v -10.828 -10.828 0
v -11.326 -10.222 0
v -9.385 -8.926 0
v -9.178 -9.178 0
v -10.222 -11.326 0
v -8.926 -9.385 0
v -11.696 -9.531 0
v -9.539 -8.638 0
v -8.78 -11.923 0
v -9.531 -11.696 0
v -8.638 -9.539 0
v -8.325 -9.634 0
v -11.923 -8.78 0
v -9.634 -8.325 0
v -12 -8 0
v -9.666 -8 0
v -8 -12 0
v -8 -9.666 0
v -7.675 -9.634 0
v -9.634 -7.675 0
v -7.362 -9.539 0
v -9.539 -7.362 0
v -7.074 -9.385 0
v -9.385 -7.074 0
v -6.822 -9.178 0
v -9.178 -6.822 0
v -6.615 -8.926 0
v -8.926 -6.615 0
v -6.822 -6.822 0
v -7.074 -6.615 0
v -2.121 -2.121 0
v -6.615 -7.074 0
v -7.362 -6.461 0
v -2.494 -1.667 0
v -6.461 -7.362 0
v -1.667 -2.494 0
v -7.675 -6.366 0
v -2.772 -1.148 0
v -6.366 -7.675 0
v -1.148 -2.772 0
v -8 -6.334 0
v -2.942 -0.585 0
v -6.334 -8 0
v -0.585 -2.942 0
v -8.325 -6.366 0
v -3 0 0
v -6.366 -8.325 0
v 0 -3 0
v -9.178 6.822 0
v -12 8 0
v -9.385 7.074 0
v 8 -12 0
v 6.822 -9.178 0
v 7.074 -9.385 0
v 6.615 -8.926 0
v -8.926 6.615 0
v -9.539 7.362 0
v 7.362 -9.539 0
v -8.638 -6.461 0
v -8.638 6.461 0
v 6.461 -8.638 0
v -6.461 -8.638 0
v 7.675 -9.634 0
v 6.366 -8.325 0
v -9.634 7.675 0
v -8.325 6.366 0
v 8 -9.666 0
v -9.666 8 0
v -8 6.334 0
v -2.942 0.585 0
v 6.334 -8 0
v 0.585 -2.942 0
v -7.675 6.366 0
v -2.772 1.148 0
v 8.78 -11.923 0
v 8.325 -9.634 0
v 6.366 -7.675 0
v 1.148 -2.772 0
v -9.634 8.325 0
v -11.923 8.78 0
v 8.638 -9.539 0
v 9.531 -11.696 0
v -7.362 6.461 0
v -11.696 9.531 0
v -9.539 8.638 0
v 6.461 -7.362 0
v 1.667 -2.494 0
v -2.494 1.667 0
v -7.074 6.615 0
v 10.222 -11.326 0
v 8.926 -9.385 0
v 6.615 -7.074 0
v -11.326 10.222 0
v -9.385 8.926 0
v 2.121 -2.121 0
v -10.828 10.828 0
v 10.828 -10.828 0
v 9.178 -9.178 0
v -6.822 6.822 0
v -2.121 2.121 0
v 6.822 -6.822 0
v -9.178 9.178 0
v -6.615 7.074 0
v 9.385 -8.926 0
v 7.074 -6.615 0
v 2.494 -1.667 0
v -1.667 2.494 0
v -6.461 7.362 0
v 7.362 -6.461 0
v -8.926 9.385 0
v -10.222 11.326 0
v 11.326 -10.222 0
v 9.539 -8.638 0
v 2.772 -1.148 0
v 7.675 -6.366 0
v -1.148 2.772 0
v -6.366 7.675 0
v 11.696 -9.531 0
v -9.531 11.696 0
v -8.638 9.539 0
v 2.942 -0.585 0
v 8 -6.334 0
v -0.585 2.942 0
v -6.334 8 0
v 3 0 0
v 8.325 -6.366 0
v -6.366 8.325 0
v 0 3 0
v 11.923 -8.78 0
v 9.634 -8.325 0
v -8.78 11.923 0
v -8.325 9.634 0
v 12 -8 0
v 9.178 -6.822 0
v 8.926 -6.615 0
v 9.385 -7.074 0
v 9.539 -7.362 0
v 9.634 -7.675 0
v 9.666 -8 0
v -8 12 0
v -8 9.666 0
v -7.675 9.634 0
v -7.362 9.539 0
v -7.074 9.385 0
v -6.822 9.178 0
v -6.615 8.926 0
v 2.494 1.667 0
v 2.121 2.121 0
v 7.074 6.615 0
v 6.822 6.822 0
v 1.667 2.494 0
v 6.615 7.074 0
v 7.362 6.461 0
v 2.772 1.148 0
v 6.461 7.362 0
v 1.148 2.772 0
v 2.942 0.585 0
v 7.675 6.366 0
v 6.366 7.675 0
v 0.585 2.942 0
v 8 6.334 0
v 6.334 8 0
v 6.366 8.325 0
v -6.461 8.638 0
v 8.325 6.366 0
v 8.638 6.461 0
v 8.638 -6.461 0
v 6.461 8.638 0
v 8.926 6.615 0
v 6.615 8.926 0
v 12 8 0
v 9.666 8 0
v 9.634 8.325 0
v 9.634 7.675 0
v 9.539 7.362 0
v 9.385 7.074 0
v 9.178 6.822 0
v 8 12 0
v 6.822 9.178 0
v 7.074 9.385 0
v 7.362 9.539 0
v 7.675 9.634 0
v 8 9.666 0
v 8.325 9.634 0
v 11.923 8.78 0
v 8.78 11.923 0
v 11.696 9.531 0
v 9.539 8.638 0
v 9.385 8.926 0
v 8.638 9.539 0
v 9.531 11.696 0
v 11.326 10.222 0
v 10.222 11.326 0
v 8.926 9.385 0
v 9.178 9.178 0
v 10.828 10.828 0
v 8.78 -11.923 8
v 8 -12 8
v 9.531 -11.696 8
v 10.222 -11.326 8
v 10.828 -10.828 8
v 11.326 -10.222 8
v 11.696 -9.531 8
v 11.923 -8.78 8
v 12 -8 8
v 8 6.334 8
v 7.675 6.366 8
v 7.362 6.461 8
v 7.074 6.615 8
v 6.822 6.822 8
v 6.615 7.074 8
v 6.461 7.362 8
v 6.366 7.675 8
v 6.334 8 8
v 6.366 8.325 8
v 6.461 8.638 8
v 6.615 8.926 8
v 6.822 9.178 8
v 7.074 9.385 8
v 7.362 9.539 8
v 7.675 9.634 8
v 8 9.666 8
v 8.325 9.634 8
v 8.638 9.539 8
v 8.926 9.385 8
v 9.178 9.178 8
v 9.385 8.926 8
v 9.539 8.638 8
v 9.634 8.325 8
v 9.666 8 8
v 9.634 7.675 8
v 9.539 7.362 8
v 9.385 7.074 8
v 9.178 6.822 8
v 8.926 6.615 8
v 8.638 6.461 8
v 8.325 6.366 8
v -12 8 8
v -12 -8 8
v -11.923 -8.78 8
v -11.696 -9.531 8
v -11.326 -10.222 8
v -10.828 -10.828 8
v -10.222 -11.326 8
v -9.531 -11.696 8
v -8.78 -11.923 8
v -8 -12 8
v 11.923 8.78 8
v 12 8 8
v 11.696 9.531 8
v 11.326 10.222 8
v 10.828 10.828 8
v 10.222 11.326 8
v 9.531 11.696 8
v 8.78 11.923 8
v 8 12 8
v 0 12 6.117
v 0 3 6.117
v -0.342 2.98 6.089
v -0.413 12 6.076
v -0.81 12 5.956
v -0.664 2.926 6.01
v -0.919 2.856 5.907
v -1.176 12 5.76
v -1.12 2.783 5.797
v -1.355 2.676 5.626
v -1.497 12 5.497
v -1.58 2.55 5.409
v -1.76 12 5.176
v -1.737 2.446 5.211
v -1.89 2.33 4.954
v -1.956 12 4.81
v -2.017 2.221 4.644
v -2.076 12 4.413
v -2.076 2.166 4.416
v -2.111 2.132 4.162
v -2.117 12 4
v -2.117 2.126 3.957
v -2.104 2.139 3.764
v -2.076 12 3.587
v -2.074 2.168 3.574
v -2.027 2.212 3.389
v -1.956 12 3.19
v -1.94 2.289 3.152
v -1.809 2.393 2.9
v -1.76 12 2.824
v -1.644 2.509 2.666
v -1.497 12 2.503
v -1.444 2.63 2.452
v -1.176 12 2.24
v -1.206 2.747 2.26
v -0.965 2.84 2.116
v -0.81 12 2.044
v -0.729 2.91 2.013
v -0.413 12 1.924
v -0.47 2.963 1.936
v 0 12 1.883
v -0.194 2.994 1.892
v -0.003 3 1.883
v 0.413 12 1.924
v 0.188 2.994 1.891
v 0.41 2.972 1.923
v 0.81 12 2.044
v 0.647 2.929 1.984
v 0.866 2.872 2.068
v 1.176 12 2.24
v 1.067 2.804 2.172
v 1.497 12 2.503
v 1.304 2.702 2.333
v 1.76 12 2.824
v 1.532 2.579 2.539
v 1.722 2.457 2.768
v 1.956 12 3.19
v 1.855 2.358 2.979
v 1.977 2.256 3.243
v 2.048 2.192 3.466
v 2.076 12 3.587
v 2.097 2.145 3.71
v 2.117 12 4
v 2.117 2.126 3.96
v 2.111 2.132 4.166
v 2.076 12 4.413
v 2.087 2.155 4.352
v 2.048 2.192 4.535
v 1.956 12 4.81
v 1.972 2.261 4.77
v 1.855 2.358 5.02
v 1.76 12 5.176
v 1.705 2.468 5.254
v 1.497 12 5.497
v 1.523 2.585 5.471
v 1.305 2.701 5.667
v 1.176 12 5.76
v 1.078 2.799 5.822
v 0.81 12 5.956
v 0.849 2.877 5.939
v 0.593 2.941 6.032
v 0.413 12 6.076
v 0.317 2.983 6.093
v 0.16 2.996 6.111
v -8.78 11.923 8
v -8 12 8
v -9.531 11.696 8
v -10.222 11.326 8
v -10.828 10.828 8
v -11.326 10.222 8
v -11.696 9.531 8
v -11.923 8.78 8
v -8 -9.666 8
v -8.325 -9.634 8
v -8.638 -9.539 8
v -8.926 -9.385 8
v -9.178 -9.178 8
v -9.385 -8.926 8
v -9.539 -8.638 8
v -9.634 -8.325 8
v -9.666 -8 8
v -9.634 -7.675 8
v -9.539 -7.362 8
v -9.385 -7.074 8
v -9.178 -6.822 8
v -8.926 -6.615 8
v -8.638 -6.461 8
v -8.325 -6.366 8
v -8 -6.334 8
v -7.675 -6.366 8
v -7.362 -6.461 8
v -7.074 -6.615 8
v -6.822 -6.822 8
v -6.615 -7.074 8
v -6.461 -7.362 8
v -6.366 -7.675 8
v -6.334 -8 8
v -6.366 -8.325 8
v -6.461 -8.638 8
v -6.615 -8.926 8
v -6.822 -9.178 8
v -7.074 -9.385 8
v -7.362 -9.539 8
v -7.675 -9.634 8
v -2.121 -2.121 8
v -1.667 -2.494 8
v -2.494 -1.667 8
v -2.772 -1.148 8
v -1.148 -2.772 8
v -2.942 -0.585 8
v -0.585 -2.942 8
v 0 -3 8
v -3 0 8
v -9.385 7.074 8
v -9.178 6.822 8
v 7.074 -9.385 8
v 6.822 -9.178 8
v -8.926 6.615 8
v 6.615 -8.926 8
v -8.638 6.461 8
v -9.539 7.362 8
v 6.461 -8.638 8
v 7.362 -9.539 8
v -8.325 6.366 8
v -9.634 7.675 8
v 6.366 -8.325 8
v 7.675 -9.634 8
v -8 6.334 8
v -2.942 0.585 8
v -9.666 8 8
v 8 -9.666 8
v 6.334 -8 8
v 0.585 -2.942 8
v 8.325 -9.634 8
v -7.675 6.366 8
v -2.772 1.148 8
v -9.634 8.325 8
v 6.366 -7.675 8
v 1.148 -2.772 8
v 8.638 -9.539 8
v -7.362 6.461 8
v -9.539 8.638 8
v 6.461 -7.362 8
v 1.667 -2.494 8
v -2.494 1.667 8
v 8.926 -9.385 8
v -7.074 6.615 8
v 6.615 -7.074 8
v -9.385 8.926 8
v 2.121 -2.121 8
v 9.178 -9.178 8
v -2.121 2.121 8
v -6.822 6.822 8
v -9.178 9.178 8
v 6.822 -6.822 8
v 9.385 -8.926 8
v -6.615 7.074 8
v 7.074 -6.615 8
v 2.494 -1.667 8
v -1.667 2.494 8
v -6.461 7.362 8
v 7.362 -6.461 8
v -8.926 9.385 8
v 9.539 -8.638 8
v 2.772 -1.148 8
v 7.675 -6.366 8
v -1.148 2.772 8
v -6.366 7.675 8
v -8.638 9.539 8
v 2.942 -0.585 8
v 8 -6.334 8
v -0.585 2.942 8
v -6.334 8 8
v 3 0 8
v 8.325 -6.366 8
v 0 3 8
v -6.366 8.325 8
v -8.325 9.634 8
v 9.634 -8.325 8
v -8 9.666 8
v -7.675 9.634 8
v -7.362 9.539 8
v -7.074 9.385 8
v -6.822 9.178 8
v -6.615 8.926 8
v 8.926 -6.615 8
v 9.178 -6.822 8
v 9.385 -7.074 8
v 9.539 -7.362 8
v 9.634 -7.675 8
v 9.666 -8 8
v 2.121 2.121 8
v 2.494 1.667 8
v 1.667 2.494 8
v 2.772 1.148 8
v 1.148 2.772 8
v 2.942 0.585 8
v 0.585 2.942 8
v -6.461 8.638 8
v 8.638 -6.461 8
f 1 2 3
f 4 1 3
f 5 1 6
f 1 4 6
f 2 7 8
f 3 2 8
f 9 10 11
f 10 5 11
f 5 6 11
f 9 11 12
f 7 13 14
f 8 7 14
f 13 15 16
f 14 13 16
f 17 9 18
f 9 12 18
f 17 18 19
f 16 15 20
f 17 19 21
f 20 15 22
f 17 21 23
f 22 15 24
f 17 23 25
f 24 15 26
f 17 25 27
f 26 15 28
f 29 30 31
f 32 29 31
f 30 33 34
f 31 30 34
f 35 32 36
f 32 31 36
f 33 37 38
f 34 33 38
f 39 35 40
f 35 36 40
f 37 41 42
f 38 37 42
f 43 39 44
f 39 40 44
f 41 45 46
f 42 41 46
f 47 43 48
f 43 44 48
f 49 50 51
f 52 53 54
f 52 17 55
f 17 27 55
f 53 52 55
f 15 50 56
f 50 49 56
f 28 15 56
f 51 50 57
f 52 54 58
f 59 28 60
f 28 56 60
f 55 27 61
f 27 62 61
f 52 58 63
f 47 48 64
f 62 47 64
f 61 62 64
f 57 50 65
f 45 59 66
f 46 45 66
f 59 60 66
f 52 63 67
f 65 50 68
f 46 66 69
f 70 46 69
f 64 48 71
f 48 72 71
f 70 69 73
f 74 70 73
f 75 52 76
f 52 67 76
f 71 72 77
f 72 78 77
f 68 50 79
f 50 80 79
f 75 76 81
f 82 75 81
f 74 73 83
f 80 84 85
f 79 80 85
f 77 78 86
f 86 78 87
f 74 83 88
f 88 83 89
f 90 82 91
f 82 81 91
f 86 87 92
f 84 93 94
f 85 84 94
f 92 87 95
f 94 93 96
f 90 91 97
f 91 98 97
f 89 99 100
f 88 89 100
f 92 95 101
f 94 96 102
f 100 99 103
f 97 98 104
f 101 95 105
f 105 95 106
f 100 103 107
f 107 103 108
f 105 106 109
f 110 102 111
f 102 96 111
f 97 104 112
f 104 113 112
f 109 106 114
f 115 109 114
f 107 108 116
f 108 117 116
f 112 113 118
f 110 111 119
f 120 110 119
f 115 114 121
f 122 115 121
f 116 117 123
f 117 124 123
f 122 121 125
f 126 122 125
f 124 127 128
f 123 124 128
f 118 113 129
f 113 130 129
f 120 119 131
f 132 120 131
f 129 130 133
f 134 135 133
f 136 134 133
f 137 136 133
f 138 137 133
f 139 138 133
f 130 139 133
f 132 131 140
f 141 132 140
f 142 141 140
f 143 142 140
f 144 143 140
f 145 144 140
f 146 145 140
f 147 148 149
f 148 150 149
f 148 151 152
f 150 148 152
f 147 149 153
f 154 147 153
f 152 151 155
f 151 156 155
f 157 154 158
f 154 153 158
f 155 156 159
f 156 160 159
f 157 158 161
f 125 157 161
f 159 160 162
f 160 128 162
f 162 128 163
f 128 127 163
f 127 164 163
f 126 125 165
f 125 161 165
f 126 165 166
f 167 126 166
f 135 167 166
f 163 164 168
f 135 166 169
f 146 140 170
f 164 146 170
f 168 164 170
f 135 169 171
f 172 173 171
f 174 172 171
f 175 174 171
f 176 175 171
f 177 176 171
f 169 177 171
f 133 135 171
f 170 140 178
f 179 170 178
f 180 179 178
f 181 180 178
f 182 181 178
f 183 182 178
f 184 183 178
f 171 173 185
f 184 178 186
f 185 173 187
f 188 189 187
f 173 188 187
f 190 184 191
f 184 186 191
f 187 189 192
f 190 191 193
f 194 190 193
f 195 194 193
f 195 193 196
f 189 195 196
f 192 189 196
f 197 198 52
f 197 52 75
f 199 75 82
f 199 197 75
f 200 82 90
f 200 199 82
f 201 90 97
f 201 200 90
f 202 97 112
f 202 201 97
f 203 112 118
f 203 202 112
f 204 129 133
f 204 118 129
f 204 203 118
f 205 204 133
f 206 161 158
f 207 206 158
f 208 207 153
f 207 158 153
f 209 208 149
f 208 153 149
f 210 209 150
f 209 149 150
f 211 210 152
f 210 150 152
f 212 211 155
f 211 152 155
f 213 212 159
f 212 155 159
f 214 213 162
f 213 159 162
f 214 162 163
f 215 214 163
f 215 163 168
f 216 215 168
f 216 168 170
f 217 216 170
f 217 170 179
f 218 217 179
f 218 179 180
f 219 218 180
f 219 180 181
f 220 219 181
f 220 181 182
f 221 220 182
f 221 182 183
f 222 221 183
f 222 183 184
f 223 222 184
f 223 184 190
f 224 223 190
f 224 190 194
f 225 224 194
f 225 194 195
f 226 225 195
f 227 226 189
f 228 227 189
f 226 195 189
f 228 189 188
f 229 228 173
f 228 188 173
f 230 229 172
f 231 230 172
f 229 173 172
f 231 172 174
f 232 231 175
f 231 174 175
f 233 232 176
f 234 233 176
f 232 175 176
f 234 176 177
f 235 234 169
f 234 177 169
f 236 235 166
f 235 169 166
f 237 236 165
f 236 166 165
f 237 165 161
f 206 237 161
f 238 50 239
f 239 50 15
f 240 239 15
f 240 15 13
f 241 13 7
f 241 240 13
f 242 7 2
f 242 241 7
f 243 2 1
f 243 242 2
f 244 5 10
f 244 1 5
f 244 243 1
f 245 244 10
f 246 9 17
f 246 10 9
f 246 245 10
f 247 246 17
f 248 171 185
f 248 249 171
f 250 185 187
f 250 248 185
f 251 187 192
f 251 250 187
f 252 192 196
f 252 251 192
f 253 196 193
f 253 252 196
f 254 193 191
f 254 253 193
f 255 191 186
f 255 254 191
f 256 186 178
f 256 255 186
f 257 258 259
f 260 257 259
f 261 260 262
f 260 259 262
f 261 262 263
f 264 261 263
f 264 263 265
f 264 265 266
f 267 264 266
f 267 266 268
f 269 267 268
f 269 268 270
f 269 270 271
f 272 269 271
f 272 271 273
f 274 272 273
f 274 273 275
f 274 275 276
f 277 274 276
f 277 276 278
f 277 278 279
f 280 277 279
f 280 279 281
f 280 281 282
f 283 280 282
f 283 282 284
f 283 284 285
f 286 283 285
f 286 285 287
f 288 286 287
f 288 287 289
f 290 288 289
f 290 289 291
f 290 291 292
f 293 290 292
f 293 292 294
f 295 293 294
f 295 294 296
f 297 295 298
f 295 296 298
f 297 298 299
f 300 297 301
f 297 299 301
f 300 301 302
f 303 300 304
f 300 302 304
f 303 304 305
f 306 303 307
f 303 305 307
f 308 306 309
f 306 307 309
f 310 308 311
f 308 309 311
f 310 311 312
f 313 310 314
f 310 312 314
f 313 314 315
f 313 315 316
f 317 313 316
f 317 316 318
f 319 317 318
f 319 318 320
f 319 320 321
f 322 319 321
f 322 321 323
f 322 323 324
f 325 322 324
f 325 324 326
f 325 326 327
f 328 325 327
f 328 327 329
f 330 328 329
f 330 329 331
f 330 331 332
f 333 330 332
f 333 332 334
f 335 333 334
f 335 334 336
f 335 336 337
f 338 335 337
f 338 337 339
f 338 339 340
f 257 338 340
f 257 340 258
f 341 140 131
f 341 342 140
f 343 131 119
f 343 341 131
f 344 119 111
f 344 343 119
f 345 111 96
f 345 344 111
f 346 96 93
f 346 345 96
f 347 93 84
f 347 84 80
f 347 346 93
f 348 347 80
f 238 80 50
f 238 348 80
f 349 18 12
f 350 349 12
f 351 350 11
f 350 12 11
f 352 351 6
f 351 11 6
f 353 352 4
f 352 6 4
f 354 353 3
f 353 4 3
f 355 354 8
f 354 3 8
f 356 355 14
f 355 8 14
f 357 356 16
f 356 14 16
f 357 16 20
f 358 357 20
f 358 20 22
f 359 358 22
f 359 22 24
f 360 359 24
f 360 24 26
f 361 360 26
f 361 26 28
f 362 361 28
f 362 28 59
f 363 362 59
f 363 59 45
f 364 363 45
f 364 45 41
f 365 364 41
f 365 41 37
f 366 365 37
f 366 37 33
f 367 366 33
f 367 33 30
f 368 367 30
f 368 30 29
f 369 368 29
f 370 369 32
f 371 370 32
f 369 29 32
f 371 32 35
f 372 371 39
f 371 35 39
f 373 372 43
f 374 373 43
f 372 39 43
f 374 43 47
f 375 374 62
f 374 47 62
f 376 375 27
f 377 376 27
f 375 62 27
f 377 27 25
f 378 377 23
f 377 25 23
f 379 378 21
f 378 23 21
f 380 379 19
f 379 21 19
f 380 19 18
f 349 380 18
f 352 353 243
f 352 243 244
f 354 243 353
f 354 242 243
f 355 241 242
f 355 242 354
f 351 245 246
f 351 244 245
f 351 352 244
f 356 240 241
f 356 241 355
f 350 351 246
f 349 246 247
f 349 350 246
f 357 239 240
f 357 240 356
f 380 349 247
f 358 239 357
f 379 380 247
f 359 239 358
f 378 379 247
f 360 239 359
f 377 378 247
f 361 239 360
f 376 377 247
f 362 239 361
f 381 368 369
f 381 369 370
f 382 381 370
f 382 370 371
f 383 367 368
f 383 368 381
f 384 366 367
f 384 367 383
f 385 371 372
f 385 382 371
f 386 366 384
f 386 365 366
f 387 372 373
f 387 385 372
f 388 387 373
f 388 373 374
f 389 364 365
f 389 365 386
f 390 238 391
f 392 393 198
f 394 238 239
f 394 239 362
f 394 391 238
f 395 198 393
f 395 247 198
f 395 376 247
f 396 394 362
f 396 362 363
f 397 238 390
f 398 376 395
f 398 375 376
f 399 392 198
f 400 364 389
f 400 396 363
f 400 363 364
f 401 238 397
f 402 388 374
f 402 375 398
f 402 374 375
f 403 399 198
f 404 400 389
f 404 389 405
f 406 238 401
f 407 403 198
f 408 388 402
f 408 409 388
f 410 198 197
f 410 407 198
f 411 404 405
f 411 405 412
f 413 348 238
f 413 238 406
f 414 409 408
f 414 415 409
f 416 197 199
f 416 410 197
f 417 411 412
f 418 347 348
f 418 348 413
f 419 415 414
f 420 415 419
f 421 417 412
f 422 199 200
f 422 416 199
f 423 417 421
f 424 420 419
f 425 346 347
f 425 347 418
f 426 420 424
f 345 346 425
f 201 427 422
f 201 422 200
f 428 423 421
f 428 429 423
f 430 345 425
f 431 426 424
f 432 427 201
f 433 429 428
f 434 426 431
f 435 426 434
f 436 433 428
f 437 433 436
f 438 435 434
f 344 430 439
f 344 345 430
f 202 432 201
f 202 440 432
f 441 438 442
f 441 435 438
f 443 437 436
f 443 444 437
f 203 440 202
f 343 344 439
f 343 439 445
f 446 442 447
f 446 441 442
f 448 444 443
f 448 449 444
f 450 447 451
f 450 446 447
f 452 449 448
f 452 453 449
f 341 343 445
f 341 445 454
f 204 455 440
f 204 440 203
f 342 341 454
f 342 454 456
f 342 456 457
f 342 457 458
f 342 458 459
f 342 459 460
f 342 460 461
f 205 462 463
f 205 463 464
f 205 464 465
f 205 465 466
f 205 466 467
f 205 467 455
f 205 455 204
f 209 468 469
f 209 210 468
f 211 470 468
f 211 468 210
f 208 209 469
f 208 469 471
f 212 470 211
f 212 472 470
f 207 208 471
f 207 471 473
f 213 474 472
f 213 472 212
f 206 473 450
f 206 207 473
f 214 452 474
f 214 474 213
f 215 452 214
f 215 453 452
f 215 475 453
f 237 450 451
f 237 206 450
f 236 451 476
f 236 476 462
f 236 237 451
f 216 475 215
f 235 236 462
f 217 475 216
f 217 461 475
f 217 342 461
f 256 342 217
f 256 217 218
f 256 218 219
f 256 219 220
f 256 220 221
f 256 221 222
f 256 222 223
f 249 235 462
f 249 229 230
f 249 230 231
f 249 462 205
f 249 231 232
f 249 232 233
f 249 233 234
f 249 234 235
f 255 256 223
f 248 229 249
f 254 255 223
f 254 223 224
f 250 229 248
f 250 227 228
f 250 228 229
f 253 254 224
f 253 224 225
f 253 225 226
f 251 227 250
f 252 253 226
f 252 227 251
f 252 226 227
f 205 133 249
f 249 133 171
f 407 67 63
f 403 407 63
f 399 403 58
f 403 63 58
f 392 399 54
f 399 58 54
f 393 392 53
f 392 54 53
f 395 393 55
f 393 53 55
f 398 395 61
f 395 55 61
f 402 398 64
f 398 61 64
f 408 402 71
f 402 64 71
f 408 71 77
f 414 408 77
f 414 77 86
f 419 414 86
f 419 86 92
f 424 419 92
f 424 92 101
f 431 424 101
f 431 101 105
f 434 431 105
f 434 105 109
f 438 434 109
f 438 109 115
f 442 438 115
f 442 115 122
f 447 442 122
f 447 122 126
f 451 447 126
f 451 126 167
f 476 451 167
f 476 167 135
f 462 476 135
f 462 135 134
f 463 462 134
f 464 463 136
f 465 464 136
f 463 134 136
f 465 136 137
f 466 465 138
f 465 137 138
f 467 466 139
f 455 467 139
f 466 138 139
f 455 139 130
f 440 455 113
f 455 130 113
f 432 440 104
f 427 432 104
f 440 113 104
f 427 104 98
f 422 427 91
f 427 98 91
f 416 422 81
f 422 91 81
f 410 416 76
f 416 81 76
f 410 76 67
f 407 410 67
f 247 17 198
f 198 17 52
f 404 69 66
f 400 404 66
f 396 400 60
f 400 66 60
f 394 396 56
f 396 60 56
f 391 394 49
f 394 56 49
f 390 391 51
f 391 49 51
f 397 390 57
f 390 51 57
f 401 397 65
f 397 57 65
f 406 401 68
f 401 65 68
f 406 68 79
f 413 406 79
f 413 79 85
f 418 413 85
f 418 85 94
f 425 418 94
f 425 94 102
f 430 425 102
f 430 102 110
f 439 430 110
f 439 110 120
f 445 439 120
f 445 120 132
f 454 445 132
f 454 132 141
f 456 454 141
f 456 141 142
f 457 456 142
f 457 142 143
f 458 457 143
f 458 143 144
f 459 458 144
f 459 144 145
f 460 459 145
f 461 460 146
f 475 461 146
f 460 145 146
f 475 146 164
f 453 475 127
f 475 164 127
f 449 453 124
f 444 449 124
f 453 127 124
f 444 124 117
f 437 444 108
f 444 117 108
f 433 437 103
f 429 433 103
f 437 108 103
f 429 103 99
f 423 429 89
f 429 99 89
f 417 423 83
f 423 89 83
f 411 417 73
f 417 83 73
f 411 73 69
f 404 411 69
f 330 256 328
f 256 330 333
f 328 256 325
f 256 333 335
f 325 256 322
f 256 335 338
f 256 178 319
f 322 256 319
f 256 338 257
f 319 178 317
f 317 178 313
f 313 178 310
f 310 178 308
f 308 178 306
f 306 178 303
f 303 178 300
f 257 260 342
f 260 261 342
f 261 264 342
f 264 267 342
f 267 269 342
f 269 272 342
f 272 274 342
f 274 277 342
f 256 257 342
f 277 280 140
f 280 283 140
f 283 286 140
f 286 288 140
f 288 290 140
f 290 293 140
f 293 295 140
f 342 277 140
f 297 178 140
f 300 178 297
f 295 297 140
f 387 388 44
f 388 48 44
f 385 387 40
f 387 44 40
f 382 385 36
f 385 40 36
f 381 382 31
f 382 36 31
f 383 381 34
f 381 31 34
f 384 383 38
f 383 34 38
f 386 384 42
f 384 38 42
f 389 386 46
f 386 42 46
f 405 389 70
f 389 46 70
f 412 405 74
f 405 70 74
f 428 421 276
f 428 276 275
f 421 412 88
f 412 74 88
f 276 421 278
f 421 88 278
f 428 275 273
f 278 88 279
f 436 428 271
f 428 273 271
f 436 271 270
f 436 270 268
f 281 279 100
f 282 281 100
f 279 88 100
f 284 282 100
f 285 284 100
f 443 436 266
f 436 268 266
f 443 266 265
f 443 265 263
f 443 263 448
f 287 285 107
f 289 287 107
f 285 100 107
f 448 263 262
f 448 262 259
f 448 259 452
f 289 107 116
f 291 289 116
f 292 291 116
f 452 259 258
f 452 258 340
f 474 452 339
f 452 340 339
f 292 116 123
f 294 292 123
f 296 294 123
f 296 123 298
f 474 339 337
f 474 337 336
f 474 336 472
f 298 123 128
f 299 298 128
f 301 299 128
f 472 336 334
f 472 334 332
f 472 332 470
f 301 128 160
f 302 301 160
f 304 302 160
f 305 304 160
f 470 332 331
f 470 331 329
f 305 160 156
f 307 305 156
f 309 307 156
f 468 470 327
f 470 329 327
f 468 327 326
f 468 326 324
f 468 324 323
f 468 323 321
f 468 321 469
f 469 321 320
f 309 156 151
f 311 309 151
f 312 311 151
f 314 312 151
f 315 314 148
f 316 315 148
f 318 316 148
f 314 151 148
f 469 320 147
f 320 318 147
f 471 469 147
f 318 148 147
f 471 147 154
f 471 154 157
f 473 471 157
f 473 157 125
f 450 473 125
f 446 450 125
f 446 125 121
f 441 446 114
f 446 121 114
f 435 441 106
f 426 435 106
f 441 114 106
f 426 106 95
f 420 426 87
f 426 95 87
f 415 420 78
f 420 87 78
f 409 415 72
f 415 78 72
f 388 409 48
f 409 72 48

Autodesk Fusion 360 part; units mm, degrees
sketch "Sketch1" plane through (0, 0, 0) normal (0, 0, 1) x (1, 0, 0)
  circle A0 centre (0, 0) radius 3 construction
  line L0 (12, 12) -> (-12, 12)
  line L1 (-12, 12) -> (-12, -12)
  line L2 (-12, -12) -> (12, -12)
  line L3 (12, -12) -> (12, 12)
  line L4 (12, 12) -> (-12, -12) construction
  line L5 (-12, 12) -> (12, -12) construction
  circle A1 centre (8, 8) radius 1.5 construction
  arc A2 (12, 8) -> (8, 12) centre (8, 8) ccw construction
  circle A3 centre (0, 0) radius 16 construction
  dimension "d1" = 6
  dimension "d2" = 24
  dimension "d3" = 3
  dimension "d4" = 8
  dimension "d23" = 32
extrude "Extrude1" add sketch "Sketch1" along normal blind 8
hole "Hole1" at (0, 0, 8) direction (0, 0, -1) diameter 6 end through all
sketch "Sketch2" plane through (0, 0, 8) normal (0, 0, 1) x (1, 0, 0)
  circle A0 centre (0, 0) radius 3
  line L0 (12, -12) -> (12, 12)
  line L1 (12, 12) -> (-12, 12)
  line L2 (-12, 12) -> (-12, -12)
  line L3 (-12, -12) -> (12, -12)
  line L4 (8, 8) -> (-8, 8)
  line L5 (-8, 8) -> (-8, -8)
  line L6 (-8, -8) -> (8, -8)
  line L7 (8, -8) -> (8, 8)
  line L8 (8, 8) -> (-8, -8) construction
  line L9 (-8, 8) -> (8, -8) construction
  dimension "d10" = 16
hole "Hole2" at (8, 8, 8) at (-8, 8, 8) at (-8, -8, 8) at (8, -8, 8) direction (0, 0, -1) diameter 3.332 end through all
sketch "Sketch3" plane through (0, 12, 0) normal (0, 1, 0) x (-1, 0, 0)
  line L0 (-12, 0) -> (12, 0)
  line L1 (12, 0) -> (12, 8)
  line L2 (12, 8) -> (-12, 8)
  line L3 (-12, 8) -> (-12, 0)
  line L4 (0, 0) -> (0, 8)
  line L5 (0, 4) -> (-12, 4)
hole "Hole3" at (0, 12, 4) direction (0, -1, 0) diameter 4.234 depth 10 tip angle 180
fillet "Fillet1" radius 4 4 edges at (12, 12, 4) (-12, 12, 4) (12, -12, 4) (-12, -12, 4)
